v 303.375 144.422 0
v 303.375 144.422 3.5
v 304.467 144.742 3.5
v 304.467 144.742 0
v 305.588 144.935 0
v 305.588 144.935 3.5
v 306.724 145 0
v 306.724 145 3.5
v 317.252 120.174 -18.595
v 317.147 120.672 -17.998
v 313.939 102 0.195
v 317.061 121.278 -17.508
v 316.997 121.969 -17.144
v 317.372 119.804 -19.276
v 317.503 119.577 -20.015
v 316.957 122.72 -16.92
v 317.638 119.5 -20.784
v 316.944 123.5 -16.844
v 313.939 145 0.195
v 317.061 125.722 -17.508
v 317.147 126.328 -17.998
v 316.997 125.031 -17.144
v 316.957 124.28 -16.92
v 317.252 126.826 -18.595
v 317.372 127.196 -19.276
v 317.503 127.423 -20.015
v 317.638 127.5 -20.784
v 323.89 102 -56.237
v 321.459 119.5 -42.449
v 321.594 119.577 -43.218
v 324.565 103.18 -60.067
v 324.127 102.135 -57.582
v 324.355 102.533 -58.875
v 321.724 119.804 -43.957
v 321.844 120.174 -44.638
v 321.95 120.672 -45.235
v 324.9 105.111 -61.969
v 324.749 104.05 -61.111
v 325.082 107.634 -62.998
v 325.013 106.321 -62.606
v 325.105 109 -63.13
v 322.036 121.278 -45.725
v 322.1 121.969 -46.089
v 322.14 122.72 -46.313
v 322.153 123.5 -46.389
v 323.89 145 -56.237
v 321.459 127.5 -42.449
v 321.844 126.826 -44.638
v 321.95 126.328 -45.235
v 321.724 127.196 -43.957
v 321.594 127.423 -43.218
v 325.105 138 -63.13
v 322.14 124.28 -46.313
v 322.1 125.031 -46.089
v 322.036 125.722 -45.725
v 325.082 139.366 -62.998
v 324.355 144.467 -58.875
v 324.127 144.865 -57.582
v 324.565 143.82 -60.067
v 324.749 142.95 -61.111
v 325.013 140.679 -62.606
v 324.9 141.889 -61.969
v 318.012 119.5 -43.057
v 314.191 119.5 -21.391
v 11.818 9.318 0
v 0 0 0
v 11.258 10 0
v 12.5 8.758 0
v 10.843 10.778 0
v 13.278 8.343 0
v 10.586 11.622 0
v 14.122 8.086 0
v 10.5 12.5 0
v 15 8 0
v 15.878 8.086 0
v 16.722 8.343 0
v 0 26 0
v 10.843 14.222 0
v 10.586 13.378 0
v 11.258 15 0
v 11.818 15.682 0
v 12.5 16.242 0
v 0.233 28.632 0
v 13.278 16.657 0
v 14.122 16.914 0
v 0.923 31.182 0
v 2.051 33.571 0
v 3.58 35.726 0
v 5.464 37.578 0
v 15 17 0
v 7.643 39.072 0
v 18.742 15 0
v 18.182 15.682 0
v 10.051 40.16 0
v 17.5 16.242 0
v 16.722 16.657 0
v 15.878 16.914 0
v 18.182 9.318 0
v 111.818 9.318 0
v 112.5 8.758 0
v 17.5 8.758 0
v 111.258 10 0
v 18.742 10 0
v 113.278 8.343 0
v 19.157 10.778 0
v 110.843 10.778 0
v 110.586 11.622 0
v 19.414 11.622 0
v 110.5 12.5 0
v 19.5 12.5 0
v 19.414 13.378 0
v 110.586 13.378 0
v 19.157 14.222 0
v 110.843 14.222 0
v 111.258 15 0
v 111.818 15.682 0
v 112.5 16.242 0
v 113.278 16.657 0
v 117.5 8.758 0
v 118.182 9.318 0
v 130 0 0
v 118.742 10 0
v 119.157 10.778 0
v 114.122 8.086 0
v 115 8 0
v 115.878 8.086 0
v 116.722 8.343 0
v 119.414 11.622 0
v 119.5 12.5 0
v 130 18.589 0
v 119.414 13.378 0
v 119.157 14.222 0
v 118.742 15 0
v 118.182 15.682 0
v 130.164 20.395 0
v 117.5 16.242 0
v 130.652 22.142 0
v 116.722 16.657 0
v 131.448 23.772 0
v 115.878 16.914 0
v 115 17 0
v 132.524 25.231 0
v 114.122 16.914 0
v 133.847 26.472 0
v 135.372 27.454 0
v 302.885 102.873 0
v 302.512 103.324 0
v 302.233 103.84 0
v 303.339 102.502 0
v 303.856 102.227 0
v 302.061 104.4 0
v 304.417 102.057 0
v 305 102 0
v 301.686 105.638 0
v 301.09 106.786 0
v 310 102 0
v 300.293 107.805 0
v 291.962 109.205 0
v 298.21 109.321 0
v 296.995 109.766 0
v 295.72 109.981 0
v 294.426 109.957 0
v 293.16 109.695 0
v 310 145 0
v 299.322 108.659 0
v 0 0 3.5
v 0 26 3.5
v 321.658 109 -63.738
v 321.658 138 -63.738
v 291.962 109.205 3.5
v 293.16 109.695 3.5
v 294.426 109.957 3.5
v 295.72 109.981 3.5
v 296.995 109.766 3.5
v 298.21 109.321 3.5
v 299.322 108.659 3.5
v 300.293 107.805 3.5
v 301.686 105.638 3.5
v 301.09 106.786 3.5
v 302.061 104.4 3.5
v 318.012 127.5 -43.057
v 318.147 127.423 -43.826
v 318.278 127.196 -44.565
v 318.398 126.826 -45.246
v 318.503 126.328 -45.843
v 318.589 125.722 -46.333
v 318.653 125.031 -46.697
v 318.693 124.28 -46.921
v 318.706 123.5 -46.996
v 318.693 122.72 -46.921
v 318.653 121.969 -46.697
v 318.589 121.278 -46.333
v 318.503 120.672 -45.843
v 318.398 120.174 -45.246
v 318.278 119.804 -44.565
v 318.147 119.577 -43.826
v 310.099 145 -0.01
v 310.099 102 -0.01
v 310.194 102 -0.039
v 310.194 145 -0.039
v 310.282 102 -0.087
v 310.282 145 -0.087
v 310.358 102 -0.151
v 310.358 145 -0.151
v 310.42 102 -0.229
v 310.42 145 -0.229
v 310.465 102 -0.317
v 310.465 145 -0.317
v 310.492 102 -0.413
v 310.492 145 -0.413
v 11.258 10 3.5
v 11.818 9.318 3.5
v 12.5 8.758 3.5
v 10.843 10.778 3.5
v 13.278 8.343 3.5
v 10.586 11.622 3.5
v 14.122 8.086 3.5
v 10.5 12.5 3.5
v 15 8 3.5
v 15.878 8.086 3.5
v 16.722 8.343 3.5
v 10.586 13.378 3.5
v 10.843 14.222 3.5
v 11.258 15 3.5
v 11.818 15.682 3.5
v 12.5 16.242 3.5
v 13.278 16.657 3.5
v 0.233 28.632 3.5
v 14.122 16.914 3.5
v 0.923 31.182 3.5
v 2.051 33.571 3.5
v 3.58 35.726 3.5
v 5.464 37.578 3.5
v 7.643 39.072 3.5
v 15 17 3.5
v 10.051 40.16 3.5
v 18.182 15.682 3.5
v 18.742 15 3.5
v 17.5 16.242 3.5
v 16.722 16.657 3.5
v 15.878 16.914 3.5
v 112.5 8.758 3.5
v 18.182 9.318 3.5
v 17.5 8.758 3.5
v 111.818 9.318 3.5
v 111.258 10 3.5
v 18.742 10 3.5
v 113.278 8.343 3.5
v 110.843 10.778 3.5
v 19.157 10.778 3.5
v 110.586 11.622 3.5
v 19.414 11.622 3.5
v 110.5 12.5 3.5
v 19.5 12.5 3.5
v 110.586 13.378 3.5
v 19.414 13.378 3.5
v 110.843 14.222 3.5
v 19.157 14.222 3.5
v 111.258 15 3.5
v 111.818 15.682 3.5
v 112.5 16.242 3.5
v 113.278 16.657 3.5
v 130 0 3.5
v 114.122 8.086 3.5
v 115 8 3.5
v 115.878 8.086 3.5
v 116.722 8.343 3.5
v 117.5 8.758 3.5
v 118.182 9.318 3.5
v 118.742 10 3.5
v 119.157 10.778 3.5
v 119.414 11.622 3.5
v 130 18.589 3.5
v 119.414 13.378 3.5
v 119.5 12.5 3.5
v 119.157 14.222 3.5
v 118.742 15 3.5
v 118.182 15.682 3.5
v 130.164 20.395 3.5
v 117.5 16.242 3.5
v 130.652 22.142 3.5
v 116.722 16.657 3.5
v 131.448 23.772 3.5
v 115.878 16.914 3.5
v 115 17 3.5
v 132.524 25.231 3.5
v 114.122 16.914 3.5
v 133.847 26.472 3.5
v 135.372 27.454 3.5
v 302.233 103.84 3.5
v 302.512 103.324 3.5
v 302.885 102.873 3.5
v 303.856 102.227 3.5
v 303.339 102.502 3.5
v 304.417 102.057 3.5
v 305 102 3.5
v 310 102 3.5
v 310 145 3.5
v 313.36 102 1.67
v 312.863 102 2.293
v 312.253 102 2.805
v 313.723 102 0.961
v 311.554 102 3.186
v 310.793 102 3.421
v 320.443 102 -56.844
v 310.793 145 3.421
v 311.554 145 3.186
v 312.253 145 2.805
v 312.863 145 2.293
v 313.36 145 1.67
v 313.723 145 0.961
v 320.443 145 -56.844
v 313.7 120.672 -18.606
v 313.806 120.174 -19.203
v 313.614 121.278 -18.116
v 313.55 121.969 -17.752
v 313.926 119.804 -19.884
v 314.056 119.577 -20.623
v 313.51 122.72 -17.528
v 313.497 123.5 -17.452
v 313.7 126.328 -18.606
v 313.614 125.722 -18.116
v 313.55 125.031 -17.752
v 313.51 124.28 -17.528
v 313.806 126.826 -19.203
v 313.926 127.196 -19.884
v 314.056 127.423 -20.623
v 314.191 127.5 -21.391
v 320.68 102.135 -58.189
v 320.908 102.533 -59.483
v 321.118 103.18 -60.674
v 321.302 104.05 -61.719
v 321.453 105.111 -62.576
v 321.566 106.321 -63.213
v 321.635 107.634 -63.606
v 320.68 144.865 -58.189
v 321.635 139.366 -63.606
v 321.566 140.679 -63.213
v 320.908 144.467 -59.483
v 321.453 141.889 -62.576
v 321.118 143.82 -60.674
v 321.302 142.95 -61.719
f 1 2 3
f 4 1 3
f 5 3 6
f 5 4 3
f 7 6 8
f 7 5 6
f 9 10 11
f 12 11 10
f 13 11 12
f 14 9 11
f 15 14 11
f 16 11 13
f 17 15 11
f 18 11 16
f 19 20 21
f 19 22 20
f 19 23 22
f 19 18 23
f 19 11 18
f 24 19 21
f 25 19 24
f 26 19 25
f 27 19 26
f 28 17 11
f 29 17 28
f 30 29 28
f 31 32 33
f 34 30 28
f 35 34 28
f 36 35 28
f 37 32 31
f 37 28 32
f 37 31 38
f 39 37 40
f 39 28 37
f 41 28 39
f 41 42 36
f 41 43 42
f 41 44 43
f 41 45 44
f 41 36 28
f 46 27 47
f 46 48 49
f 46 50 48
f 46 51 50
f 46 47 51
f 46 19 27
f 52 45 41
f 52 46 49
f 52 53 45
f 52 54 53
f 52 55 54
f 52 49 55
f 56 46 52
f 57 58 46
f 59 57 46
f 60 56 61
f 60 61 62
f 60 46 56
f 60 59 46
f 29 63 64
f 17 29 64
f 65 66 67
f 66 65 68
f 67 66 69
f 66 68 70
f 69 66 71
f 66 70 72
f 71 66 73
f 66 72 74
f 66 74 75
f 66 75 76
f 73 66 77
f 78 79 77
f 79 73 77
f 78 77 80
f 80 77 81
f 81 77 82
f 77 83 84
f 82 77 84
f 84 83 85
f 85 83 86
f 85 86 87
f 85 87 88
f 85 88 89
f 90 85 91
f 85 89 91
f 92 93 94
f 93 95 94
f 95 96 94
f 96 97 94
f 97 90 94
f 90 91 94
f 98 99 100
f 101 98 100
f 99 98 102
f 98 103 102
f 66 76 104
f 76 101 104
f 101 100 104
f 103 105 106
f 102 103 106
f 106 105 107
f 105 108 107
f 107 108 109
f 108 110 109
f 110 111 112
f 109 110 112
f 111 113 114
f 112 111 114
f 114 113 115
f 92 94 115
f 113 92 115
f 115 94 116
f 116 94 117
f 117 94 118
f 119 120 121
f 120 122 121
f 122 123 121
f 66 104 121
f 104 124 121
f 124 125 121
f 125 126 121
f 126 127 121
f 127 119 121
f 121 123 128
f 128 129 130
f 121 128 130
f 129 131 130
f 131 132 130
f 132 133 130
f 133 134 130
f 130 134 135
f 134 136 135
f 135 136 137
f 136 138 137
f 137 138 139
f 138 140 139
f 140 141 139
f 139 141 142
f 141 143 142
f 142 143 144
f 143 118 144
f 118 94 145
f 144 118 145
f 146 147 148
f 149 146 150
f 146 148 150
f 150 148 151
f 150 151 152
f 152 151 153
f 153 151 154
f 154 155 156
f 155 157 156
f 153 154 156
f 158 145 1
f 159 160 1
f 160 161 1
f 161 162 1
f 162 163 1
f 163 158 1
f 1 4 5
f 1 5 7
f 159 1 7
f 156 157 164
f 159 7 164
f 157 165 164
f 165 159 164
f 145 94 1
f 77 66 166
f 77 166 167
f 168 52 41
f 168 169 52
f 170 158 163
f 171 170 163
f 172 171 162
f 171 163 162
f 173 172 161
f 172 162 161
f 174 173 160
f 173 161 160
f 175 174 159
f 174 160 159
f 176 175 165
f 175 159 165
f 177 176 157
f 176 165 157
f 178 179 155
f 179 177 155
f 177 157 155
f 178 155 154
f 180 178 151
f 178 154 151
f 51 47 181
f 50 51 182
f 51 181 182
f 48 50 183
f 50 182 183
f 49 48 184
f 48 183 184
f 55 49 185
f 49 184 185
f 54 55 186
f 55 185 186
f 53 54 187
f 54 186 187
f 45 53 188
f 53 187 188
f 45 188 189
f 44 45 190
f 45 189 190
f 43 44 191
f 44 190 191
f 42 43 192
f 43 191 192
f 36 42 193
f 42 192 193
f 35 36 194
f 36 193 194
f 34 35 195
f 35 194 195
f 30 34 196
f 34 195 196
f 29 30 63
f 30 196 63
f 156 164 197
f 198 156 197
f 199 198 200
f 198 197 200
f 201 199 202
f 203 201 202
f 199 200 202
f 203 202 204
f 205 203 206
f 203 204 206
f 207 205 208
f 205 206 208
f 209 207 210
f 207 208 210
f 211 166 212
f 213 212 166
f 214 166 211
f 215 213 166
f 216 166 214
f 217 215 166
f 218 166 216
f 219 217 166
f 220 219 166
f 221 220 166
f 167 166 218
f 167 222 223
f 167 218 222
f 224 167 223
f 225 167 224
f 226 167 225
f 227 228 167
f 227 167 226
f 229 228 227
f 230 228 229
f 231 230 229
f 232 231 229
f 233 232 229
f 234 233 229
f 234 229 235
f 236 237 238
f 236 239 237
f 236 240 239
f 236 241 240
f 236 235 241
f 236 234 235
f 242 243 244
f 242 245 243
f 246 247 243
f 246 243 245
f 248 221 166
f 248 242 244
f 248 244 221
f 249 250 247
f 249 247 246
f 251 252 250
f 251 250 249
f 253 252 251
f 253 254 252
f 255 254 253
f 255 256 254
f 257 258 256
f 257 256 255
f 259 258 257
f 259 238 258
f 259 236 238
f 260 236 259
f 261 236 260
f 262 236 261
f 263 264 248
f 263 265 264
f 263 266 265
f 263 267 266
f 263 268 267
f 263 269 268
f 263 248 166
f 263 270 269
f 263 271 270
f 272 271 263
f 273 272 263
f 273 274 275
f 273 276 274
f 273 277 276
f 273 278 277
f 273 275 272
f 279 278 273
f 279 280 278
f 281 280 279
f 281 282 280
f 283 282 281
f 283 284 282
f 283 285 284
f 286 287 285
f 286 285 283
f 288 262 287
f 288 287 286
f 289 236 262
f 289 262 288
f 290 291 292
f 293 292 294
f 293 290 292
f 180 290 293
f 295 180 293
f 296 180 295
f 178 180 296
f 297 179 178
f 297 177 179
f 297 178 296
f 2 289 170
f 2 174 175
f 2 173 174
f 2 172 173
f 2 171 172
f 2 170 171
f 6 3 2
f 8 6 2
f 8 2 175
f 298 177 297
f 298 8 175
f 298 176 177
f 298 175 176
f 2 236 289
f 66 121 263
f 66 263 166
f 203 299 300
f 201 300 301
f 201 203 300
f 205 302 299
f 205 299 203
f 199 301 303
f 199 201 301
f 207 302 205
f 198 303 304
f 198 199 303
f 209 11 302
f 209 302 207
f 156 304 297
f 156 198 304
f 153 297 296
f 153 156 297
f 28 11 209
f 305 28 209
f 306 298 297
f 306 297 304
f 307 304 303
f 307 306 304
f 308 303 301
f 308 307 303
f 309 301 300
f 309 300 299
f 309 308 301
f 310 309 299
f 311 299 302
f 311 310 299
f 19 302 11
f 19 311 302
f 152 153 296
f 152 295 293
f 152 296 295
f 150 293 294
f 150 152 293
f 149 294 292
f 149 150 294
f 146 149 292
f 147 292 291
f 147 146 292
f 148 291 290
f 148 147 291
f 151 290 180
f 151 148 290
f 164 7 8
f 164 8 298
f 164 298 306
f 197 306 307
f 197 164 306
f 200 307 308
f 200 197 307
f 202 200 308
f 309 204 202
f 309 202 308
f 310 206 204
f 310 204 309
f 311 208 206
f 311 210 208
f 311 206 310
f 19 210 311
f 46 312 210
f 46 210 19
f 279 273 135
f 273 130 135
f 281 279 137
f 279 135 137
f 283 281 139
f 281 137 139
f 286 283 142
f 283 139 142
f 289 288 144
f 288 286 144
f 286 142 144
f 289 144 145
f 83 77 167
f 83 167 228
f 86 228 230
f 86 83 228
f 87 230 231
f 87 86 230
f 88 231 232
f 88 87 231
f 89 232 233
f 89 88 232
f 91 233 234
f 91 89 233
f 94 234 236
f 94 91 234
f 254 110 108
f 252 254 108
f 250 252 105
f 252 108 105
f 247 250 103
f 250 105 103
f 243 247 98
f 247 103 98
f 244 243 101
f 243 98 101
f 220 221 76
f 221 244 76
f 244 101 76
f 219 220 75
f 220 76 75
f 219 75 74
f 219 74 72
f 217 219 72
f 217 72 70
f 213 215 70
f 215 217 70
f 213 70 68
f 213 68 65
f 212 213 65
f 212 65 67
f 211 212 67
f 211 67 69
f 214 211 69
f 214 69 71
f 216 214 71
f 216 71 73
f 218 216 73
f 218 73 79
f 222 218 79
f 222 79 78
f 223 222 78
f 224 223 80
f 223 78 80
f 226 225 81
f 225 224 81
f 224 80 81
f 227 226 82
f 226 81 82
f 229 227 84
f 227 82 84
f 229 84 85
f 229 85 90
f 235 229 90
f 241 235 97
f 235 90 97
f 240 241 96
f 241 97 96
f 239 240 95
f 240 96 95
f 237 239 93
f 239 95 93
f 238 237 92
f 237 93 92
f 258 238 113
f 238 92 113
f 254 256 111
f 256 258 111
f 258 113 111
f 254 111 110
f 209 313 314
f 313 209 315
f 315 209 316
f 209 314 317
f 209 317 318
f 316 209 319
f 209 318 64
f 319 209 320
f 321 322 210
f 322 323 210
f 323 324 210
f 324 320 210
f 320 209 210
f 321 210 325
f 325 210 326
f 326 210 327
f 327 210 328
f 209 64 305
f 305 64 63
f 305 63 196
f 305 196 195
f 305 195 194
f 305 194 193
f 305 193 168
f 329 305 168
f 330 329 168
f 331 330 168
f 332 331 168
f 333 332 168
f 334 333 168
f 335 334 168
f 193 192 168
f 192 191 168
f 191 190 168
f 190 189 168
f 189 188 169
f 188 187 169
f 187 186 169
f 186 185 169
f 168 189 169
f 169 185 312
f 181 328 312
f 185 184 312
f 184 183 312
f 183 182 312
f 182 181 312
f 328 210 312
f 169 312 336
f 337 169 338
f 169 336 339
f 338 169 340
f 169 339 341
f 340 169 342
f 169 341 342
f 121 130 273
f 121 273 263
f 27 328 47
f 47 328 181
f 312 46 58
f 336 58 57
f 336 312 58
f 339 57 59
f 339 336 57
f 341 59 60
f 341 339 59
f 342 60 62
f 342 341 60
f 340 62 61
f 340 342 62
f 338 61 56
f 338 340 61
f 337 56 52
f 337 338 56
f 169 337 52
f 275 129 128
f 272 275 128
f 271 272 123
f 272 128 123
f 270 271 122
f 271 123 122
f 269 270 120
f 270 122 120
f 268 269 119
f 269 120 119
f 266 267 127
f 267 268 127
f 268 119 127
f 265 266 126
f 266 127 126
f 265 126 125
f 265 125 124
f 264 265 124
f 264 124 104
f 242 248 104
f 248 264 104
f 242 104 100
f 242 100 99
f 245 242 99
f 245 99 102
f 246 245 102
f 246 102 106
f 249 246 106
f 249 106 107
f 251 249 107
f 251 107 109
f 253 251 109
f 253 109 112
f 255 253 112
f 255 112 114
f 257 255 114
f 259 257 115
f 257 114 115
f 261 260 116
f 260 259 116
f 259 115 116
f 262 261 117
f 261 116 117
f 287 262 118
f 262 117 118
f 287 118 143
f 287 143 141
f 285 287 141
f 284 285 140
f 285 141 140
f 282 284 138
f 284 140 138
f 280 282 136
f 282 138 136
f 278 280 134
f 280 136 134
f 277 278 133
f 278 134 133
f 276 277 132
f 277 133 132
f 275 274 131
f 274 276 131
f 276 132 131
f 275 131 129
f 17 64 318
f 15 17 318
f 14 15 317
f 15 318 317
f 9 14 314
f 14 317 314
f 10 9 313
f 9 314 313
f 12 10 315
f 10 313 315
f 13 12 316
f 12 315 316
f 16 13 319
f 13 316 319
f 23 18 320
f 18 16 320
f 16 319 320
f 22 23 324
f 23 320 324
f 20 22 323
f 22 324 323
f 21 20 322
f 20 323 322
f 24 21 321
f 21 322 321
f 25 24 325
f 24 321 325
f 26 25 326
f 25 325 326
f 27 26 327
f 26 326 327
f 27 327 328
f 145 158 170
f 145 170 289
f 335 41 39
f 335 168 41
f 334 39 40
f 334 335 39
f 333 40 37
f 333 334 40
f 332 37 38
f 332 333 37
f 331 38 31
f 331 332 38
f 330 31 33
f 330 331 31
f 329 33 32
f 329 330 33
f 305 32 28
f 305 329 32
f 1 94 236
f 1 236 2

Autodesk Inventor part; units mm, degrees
ref_plane "YZ Plane" through (0, 0, 0) normal (1, 0, 0) x (0, 1, 0)
ref_plane "XZ Plane" through (0, 0, 0) normal (0, 1, 0) x (-1, 0, 0)
ref_plane "XY Plane" through (0, 0, 0) normal (0, 0, 1) x (1, 0, 0)
sketch "草圖1" plane through (0, 0, 0) normal (0, 0, 1) x (1, 0, 0)
  line L0 (0, 0) -> (-7.8042, 0) construction
  line L1 (0, 0) -> (0, -16.694) construction
  line L2 (0, 0) -> (0, 26)
  line L3 (310, 145) -> (310, 102)
  line L4 (130, 18.5892) -> (130, 0)
  line L5 (130, 0) -> (0, 0)
  line L6 (310, 145) -> (368, 145)
  line L7 (375, 138) -> (375, 109)
  line L8 (368, 102) -> (310, 102)
  line L9 (332, 127.5) -> (354, 127.5)
  arc A0 (354, 119.5) -> (354, 127.5) centre (354, 123.5) ccw
  line L10 (354, 119.5) -> (332, 119.5)
  arc A1 (332, 127.5) -> (332, 119.5) centre (332, 123.5) ccw
  circle A2 centre (15, 12.5) radius 4.5
  circle A3 centre (115, 12.5) radius 4.5
  line L11 (15, 12.5) -> (115, 12.5) construction
  arc A4 (10.0507, 40.16) -> (0, 26) centre (15, 26) ccw
  line L12 (9.9762, 40.1337) -> (303.3752, 144.4225)
  line L13 (306.7244, 145) -> (310, 145)
  line L14 (310, 102) -> (305, 102)
  line L15 (291.9625, 109.2052) -> (135.372, 27.4539)
  arc A5 (375, 138) -> (368, 145) centre (368, 138) ccw
  arc A6 (368, 102) -> (375, 109) centre (368, 109) ccw
  arc A7 (302.0606, 104.4) -> (305, 102) centre (305, 105) ccw
  arc A8 (302.0606, 104.4) -> (291.9625, 109.2052) centre (295.202, 103) ccw
  arc A9 (306.7244, 145) -> (303.3752, 144.4225) centre (306.7244, 135) ccw
  arc A10 (135.372, 27.4539) -> (130, 18.5892) centre (140, 18.5892) ccw
  point P0 (130, 34.6822)
  point P1 (375, 145)
  point P2 (375, 102)
  point P3 (65, 12.5)
  point P4 (65, 0)
  point P5 (130, 24.6493)
  point P6 (305, 145)
  point P7 (305, 102)
  point P8 (305, 116.0118)
  dimension "d0" = 130
  dimension "d1" = 145
  dimension "d2" = 43
  dimension "d3" = 65
  dimension "d4" = 8
  dimension "d5" = 30
  dimension "d7" = 18
  dimension "d8" = 310
  dimension "d14" = 12.5
  dimension "d15" = 100
  dimension "d16" = 9
  dimension "d17" = 21.5
  dimension "d20" = 15
  dimension "d21" = 26
  dimension "d23" = 5
  dimension "d24" = 7
  dimension "d26" = 3
  dimension "d28" = 35
  dimension "d29" = 7
  dimension "d30" = 5
  dimension "d31" = 10
  dimension "d32" = 10
  dimension "d33" = 8
extrude "擠出1" add sketch "草圖1" along normal blind 3.5
bend part "折彎零件1" radius 0.5 angle 80 line through (310, 145, 0) along (0, -1, 0) centre toward (0, 0, -1) moving side (1, 0, 0) both sides no
properties part number "0 零件"
